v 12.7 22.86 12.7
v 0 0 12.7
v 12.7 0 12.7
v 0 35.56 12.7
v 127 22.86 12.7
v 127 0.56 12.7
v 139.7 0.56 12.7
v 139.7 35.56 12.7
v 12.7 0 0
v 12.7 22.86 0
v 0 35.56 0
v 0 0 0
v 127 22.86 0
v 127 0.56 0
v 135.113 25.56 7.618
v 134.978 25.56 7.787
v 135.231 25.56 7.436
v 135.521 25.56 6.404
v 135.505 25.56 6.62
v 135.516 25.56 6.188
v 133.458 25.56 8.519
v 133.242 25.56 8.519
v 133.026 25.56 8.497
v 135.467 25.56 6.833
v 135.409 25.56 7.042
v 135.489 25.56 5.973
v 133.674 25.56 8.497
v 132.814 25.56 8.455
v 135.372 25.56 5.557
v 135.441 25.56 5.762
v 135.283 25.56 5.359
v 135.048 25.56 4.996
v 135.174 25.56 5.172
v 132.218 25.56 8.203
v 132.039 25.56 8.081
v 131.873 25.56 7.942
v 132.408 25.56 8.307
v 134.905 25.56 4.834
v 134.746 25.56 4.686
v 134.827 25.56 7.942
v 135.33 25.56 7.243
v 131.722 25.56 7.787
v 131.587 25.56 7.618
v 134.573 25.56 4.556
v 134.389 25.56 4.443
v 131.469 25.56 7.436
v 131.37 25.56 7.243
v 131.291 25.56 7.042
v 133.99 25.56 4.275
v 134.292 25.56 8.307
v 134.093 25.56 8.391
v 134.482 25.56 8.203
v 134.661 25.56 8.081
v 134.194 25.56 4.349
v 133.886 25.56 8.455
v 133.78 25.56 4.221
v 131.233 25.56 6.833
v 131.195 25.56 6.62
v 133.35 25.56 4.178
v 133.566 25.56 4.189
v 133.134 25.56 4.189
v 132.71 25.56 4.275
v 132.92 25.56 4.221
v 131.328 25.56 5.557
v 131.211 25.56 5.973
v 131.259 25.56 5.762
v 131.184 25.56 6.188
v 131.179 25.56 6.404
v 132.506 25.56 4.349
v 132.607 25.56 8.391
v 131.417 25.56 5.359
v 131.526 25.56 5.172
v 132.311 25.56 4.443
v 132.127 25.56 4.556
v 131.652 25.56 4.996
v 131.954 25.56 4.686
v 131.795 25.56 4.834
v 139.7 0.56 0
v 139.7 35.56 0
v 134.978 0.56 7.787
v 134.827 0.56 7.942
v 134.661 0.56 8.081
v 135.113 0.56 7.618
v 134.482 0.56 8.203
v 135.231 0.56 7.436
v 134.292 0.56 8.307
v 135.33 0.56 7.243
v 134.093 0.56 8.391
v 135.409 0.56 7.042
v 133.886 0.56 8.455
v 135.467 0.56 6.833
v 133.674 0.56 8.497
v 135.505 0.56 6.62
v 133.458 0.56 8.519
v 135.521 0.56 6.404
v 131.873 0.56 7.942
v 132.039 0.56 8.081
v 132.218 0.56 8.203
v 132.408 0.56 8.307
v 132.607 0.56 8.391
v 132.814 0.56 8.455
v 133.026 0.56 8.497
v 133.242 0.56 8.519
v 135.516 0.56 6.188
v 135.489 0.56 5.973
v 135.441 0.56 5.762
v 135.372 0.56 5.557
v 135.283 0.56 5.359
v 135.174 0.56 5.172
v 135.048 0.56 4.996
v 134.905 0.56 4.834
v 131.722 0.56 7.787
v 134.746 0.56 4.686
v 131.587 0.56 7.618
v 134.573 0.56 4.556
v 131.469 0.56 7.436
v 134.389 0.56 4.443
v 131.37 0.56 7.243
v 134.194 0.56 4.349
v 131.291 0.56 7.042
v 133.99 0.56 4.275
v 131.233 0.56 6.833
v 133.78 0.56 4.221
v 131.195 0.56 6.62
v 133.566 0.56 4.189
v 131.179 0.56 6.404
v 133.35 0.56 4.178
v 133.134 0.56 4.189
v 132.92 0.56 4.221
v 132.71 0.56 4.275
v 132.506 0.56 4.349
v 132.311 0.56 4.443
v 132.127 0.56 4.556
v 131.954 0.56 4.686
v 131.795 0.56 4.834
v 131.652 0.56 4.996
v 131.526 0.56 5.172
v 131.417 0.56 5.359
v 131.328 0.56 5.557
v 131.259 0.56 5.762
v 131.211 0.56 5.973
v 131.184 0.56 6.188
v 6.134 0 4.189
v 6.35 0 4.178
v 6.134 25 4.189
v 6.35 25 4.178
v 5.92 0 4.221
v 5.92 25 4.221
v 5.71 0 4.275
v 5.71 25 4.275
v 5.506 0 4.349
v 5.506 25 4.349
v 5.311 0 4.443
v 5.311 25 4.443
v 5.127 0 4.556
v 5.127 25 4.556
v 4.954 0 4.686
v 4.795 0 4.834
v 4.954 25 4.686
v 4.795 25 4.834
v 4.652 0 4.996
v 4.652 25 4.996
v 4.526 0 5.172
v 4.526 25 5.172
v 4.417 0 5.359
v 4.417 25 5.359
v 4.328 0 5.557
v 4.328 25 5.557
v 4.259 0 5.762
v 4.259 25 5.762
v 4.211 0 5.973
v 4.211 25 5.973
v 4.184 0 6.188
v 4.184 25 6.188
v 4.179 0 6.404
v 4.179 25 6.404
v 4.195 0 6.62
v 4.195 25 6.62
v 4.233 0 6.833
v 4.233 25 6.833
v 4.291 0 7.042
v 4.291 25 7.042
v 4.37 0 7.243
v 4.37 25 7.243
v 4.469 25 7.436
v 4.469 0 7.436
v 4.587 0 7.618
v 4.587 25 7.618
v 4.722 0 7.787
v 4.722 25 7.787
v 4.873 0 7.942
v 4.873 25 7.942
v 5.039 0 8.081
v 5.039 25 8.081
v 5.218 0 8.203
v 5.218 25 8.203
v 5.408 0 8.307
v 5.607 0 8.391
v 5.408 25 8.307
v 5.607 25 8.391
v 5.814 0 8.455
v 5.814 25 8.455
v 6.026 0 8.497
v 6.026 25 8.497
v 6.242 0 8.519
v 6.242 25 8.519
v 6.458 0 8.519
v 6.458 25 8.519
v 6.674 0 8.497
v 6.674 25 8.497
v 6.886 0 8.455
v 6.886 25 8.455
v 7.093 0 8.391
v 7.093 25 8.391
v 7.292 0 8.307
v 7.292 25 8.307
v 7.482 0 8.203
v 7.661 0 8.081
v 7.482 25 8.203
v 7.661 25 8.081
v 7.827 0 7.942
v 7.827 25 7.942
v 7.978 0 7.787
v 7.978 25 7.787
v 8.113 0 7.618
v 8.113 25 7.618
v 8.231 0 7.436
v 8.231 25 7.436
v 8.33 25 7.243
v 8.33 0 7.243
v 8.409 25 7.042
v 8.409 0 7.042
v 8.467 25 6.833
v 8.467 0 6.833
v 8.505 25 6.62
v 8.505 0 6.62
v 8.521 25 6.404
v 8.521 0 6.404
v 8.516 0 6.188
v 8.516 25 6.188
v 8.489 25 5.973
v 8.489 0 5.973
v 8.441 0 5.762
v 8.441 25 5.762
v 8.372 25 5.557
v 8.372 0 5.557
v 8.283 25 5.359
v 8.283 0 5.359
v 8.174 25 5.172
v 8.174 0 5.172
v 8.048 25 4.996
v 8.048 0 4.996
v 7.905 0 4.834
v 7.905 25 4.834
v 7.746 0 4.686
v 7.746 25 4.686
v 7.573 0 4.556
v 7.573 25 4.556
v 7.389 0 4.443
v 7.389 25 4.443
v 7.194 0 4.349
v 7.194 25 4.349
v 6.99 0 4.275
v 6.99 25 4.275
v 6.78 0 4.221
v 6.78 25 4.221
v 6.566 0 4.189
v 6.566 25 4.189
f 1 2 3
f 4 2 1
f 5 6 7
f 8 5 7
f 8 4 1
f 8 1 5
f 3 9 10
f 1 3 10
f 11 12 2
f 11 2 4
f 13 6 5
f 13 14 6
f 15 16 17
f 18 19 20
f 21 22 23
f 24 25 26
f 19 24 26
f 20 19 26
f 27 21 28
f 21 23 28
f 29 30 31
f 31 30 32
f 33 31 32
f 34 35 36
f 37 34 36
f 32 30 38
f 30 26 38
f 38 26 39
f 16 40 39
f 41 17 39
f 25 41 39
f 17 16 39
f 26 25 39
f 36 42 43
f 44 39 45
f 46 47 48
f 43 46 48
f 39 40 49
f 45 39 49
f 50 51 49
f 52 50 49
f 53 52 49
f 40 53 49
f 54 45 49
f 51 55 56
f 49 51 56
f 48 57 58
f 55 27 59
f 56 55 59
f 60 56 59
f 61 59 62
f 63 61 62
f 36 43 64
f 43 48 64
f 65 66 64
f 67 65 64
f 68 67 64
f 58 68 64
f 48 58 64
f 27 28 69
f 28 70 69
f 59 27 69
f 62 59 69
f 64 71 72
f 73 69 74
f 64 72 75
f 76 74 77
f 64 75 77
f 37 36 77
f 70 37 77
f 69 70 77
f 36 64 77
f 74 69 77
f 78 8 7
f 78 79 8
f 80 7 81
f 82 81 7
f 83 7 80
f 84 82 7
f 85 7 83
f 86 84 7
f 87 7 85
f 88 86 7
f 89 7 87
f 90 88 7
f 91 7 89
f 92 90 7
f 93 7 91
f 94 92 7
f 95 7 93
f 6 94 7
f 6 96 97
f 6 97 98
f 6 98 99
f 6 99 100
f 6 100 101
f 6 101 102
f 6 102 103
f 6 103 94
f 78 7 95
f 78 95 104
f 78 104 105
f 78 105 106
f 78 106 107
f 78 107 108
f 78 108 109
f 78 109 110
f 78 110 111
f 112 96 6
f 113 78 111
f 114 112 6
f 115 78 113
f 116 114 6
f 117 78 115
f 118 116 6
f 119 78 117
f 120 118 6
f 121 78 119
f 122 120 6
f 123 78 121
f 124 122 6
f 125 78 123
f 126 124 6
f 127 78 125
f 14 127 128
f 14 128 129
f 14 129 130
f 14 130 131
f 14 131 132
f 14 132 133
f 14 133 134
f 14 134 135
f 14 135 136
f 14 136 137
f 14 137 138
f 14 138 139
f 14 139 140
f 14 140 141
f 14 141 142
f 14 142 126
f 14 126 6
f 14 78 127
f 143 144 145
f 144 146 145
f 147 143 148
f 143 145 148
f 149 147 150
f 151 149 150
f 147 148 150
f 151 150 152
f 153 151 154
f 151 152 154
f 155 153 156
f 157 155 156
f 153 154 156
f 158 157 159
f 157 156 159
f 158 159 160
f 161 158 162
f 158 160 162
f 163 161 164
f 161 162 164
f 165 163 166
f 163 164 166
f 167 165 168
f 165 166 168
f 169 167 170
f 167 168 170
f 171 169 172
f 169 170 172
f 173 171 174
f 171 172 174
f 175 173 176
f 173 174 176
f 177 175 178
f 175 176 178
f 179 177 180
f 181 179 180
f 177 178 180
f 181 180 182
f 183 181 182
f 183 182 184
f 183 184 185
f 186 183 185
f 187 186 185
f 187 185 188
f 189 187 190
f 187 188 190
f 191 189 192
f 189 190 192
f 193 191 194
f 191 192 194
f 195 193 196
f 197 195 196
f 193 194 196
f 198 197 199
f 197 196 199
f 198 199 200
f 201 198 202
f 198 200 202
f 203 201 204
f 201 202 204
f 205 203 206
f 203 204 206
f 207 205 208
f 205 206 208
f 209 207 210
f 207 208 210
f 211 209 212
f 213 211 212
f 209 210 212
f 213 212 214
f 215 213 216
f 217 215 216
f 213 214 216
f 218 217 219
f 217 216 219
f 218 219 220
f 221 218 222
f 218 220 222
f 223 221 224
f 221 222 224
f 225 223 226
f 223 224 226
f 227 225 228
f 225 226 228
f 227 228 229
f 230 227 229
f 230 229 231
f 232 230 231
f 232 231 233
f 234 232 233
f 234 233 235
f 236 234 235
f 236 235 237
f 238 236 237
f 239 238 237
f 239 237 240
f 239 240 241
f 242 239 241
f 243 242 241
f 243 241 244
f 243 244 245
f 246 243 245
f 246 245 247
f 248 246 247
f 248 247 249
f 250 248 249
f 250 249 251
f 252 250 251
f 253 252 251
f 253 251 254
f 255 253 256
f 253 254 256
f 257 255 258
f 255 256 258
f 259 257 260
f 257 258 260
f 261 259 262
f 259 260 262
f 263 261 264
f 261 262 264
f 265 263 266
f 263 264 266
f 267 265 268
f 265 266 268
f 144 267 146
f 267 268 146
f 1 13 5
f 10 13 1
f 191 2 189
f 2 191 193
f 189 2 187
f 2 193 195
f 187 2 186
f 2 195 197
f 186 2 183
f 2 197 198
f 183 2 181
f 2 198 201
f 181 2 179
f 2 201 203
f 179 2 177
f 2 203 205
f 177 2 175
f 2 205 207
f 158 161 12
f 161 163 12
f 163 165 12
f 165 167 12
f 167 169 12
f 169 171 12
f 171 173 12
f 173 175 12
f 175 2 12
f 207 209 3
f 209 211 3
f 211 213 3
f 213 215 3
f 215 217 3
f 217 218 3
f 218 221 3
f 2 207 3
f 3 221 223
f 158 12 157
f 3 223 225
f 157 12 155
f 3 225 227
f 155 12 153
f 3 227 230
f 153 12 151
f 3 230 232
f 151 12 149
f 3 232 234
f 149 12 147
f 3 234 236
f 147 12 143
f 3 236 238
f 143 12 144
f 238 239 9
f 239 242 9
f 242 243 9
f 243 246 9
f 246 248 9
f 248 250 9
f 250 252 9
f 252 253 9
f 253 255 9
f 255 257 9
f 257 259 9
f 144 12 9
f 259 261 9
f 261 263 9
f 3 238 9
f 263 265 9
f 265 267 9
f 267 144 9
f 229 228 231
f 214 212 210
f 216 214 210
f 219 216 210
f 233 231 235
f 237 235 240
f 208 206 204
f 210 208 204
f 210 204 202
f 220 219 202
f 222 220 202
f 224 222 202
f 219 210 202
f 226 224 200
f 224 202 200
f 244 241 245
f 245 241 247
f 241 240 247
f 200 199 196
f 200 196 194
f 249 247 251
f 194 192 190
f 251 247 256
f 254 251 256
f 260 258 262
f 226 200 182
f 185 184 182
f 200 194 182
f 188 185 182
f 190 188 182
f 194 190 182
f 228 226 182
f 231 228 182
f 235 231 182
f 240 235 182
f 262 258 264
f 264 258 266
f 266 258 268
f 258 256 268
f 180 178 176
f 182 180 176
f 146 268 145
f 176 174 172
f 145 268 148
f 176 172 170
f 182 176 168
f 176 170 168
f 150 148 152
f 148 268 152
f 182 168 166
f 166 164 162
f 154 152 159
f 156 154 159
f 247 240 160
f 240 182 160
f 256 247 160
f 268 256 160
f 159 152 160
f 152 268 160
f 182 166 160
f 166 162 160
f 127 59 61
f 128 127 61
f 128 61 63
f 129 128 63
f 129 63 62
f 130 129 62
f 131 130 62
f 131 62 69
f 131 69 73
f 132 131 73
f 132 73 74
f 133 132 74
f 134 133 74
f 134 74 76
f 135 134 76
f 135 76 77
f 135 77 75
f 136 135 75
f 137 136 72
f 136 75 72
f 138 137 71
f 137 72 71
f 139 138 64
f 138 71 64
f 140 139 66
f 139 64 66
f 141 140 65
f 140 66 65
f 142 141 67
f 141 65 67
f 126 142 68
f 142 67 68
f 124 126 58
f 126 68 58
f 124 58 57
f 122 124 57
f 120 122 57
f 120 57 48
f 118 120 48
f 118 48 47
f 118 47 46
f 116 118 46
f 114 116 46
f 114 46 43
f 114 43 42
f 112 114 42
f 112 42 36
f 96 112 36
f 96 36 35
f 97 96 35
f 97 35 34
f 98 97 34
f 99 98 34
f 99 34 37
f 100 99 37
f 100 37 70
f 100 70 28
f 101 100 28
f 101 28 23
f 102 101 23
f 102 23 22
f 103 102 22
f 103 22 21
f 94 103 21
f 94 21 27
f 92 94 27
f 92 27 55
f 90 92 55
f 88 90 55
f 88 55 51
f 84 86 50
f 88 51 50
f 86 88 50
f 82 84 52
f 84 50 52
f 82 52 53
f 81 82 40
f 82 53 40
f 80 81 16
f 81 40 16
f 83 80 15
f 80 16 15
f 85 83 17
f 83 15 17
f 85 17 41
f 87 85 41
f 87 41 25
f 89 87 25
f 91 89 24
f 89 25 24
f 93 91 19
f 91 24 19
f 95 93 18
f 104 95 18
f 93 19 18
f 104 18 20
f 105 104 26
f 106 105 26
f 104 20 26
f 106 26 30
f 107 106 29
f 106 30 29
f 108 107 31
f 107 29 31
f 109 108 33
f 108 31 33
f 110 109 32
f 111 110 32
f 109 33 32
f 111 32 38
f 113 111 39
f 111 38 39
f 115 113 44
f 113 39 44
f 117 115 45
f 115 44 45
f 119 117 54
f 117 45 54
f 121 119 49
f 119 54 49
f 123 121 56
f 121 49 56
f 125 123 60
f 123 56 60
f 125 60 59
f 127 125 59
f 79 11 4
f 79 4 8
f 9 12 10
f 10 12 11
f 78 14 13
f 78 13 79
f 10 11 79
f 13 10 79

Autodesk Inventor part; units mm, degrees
ref_plane "YZ Plane" through (0, 0, 0) normal (1, 0, 0) x (0, 1, 0)
ref_plane "XZ Plane" through (0, 0, 0) normal (0, 1, 0) x (-1, 0, 0)
ref_plane "XY Plane" through (0, 0, 0) normal (0, 0, 1) x (1, 0, 0)
sketch "Sketch1" plane through (0, 0, 0) normal (0, 0, 1) x (1, 0, 0)
  line L0 (0, 0) -> (12.7, 0)
  line L1 (12.7, 0) -> (12.7, 22.86)
  line L2 (0, 0) -> (0, 35.56)
  line L3 (0, 35.56) -> (139.7, 35.56)
  line L4 (139.7, 35.56) -> (139.7, 0.56)
  line L5 (139.7, 0.56) -> (127, 0.56)
  line L6 (127, 0.56) -> (127, 22.86)
  line L7 (127, 22.86) -> (12.7, 22.86)
  line L8 (6.35, 28.6931) -> (133.35, 28.6931) construction
  line L9 (6.35, 28.6931) -> (6.35, 0) construction
  line L10 (133.35, 28.6931) -> (133.35, 0) construction
  dimension "d0" = 12.7
  dimension "d2" = 35.56
  dimension "d4" = 12.7
  dimension "d28" = 12.7
  dimension "d29" = 127
extrude "Extrusion1" add sketch "Sketch1" along normal blind 12.7
hole "Hole1" at (6.35, 0, 6.35) direction (0, 1, 0) diameter 4.3434 depth 25 thread size "12-24 UNC" class "2B" standard "ANSI Unified Screw Threads"
hole "Hole2" at (133.35, 0.56, 6.35) direction (0, 1, 0) diameter 4.3434 depth 25 thread size "12-24 UNC" class "2B" standard "ANSI Unified Screw Threads"
properties part number "BarHandle5in" material "Stainless Steel"
